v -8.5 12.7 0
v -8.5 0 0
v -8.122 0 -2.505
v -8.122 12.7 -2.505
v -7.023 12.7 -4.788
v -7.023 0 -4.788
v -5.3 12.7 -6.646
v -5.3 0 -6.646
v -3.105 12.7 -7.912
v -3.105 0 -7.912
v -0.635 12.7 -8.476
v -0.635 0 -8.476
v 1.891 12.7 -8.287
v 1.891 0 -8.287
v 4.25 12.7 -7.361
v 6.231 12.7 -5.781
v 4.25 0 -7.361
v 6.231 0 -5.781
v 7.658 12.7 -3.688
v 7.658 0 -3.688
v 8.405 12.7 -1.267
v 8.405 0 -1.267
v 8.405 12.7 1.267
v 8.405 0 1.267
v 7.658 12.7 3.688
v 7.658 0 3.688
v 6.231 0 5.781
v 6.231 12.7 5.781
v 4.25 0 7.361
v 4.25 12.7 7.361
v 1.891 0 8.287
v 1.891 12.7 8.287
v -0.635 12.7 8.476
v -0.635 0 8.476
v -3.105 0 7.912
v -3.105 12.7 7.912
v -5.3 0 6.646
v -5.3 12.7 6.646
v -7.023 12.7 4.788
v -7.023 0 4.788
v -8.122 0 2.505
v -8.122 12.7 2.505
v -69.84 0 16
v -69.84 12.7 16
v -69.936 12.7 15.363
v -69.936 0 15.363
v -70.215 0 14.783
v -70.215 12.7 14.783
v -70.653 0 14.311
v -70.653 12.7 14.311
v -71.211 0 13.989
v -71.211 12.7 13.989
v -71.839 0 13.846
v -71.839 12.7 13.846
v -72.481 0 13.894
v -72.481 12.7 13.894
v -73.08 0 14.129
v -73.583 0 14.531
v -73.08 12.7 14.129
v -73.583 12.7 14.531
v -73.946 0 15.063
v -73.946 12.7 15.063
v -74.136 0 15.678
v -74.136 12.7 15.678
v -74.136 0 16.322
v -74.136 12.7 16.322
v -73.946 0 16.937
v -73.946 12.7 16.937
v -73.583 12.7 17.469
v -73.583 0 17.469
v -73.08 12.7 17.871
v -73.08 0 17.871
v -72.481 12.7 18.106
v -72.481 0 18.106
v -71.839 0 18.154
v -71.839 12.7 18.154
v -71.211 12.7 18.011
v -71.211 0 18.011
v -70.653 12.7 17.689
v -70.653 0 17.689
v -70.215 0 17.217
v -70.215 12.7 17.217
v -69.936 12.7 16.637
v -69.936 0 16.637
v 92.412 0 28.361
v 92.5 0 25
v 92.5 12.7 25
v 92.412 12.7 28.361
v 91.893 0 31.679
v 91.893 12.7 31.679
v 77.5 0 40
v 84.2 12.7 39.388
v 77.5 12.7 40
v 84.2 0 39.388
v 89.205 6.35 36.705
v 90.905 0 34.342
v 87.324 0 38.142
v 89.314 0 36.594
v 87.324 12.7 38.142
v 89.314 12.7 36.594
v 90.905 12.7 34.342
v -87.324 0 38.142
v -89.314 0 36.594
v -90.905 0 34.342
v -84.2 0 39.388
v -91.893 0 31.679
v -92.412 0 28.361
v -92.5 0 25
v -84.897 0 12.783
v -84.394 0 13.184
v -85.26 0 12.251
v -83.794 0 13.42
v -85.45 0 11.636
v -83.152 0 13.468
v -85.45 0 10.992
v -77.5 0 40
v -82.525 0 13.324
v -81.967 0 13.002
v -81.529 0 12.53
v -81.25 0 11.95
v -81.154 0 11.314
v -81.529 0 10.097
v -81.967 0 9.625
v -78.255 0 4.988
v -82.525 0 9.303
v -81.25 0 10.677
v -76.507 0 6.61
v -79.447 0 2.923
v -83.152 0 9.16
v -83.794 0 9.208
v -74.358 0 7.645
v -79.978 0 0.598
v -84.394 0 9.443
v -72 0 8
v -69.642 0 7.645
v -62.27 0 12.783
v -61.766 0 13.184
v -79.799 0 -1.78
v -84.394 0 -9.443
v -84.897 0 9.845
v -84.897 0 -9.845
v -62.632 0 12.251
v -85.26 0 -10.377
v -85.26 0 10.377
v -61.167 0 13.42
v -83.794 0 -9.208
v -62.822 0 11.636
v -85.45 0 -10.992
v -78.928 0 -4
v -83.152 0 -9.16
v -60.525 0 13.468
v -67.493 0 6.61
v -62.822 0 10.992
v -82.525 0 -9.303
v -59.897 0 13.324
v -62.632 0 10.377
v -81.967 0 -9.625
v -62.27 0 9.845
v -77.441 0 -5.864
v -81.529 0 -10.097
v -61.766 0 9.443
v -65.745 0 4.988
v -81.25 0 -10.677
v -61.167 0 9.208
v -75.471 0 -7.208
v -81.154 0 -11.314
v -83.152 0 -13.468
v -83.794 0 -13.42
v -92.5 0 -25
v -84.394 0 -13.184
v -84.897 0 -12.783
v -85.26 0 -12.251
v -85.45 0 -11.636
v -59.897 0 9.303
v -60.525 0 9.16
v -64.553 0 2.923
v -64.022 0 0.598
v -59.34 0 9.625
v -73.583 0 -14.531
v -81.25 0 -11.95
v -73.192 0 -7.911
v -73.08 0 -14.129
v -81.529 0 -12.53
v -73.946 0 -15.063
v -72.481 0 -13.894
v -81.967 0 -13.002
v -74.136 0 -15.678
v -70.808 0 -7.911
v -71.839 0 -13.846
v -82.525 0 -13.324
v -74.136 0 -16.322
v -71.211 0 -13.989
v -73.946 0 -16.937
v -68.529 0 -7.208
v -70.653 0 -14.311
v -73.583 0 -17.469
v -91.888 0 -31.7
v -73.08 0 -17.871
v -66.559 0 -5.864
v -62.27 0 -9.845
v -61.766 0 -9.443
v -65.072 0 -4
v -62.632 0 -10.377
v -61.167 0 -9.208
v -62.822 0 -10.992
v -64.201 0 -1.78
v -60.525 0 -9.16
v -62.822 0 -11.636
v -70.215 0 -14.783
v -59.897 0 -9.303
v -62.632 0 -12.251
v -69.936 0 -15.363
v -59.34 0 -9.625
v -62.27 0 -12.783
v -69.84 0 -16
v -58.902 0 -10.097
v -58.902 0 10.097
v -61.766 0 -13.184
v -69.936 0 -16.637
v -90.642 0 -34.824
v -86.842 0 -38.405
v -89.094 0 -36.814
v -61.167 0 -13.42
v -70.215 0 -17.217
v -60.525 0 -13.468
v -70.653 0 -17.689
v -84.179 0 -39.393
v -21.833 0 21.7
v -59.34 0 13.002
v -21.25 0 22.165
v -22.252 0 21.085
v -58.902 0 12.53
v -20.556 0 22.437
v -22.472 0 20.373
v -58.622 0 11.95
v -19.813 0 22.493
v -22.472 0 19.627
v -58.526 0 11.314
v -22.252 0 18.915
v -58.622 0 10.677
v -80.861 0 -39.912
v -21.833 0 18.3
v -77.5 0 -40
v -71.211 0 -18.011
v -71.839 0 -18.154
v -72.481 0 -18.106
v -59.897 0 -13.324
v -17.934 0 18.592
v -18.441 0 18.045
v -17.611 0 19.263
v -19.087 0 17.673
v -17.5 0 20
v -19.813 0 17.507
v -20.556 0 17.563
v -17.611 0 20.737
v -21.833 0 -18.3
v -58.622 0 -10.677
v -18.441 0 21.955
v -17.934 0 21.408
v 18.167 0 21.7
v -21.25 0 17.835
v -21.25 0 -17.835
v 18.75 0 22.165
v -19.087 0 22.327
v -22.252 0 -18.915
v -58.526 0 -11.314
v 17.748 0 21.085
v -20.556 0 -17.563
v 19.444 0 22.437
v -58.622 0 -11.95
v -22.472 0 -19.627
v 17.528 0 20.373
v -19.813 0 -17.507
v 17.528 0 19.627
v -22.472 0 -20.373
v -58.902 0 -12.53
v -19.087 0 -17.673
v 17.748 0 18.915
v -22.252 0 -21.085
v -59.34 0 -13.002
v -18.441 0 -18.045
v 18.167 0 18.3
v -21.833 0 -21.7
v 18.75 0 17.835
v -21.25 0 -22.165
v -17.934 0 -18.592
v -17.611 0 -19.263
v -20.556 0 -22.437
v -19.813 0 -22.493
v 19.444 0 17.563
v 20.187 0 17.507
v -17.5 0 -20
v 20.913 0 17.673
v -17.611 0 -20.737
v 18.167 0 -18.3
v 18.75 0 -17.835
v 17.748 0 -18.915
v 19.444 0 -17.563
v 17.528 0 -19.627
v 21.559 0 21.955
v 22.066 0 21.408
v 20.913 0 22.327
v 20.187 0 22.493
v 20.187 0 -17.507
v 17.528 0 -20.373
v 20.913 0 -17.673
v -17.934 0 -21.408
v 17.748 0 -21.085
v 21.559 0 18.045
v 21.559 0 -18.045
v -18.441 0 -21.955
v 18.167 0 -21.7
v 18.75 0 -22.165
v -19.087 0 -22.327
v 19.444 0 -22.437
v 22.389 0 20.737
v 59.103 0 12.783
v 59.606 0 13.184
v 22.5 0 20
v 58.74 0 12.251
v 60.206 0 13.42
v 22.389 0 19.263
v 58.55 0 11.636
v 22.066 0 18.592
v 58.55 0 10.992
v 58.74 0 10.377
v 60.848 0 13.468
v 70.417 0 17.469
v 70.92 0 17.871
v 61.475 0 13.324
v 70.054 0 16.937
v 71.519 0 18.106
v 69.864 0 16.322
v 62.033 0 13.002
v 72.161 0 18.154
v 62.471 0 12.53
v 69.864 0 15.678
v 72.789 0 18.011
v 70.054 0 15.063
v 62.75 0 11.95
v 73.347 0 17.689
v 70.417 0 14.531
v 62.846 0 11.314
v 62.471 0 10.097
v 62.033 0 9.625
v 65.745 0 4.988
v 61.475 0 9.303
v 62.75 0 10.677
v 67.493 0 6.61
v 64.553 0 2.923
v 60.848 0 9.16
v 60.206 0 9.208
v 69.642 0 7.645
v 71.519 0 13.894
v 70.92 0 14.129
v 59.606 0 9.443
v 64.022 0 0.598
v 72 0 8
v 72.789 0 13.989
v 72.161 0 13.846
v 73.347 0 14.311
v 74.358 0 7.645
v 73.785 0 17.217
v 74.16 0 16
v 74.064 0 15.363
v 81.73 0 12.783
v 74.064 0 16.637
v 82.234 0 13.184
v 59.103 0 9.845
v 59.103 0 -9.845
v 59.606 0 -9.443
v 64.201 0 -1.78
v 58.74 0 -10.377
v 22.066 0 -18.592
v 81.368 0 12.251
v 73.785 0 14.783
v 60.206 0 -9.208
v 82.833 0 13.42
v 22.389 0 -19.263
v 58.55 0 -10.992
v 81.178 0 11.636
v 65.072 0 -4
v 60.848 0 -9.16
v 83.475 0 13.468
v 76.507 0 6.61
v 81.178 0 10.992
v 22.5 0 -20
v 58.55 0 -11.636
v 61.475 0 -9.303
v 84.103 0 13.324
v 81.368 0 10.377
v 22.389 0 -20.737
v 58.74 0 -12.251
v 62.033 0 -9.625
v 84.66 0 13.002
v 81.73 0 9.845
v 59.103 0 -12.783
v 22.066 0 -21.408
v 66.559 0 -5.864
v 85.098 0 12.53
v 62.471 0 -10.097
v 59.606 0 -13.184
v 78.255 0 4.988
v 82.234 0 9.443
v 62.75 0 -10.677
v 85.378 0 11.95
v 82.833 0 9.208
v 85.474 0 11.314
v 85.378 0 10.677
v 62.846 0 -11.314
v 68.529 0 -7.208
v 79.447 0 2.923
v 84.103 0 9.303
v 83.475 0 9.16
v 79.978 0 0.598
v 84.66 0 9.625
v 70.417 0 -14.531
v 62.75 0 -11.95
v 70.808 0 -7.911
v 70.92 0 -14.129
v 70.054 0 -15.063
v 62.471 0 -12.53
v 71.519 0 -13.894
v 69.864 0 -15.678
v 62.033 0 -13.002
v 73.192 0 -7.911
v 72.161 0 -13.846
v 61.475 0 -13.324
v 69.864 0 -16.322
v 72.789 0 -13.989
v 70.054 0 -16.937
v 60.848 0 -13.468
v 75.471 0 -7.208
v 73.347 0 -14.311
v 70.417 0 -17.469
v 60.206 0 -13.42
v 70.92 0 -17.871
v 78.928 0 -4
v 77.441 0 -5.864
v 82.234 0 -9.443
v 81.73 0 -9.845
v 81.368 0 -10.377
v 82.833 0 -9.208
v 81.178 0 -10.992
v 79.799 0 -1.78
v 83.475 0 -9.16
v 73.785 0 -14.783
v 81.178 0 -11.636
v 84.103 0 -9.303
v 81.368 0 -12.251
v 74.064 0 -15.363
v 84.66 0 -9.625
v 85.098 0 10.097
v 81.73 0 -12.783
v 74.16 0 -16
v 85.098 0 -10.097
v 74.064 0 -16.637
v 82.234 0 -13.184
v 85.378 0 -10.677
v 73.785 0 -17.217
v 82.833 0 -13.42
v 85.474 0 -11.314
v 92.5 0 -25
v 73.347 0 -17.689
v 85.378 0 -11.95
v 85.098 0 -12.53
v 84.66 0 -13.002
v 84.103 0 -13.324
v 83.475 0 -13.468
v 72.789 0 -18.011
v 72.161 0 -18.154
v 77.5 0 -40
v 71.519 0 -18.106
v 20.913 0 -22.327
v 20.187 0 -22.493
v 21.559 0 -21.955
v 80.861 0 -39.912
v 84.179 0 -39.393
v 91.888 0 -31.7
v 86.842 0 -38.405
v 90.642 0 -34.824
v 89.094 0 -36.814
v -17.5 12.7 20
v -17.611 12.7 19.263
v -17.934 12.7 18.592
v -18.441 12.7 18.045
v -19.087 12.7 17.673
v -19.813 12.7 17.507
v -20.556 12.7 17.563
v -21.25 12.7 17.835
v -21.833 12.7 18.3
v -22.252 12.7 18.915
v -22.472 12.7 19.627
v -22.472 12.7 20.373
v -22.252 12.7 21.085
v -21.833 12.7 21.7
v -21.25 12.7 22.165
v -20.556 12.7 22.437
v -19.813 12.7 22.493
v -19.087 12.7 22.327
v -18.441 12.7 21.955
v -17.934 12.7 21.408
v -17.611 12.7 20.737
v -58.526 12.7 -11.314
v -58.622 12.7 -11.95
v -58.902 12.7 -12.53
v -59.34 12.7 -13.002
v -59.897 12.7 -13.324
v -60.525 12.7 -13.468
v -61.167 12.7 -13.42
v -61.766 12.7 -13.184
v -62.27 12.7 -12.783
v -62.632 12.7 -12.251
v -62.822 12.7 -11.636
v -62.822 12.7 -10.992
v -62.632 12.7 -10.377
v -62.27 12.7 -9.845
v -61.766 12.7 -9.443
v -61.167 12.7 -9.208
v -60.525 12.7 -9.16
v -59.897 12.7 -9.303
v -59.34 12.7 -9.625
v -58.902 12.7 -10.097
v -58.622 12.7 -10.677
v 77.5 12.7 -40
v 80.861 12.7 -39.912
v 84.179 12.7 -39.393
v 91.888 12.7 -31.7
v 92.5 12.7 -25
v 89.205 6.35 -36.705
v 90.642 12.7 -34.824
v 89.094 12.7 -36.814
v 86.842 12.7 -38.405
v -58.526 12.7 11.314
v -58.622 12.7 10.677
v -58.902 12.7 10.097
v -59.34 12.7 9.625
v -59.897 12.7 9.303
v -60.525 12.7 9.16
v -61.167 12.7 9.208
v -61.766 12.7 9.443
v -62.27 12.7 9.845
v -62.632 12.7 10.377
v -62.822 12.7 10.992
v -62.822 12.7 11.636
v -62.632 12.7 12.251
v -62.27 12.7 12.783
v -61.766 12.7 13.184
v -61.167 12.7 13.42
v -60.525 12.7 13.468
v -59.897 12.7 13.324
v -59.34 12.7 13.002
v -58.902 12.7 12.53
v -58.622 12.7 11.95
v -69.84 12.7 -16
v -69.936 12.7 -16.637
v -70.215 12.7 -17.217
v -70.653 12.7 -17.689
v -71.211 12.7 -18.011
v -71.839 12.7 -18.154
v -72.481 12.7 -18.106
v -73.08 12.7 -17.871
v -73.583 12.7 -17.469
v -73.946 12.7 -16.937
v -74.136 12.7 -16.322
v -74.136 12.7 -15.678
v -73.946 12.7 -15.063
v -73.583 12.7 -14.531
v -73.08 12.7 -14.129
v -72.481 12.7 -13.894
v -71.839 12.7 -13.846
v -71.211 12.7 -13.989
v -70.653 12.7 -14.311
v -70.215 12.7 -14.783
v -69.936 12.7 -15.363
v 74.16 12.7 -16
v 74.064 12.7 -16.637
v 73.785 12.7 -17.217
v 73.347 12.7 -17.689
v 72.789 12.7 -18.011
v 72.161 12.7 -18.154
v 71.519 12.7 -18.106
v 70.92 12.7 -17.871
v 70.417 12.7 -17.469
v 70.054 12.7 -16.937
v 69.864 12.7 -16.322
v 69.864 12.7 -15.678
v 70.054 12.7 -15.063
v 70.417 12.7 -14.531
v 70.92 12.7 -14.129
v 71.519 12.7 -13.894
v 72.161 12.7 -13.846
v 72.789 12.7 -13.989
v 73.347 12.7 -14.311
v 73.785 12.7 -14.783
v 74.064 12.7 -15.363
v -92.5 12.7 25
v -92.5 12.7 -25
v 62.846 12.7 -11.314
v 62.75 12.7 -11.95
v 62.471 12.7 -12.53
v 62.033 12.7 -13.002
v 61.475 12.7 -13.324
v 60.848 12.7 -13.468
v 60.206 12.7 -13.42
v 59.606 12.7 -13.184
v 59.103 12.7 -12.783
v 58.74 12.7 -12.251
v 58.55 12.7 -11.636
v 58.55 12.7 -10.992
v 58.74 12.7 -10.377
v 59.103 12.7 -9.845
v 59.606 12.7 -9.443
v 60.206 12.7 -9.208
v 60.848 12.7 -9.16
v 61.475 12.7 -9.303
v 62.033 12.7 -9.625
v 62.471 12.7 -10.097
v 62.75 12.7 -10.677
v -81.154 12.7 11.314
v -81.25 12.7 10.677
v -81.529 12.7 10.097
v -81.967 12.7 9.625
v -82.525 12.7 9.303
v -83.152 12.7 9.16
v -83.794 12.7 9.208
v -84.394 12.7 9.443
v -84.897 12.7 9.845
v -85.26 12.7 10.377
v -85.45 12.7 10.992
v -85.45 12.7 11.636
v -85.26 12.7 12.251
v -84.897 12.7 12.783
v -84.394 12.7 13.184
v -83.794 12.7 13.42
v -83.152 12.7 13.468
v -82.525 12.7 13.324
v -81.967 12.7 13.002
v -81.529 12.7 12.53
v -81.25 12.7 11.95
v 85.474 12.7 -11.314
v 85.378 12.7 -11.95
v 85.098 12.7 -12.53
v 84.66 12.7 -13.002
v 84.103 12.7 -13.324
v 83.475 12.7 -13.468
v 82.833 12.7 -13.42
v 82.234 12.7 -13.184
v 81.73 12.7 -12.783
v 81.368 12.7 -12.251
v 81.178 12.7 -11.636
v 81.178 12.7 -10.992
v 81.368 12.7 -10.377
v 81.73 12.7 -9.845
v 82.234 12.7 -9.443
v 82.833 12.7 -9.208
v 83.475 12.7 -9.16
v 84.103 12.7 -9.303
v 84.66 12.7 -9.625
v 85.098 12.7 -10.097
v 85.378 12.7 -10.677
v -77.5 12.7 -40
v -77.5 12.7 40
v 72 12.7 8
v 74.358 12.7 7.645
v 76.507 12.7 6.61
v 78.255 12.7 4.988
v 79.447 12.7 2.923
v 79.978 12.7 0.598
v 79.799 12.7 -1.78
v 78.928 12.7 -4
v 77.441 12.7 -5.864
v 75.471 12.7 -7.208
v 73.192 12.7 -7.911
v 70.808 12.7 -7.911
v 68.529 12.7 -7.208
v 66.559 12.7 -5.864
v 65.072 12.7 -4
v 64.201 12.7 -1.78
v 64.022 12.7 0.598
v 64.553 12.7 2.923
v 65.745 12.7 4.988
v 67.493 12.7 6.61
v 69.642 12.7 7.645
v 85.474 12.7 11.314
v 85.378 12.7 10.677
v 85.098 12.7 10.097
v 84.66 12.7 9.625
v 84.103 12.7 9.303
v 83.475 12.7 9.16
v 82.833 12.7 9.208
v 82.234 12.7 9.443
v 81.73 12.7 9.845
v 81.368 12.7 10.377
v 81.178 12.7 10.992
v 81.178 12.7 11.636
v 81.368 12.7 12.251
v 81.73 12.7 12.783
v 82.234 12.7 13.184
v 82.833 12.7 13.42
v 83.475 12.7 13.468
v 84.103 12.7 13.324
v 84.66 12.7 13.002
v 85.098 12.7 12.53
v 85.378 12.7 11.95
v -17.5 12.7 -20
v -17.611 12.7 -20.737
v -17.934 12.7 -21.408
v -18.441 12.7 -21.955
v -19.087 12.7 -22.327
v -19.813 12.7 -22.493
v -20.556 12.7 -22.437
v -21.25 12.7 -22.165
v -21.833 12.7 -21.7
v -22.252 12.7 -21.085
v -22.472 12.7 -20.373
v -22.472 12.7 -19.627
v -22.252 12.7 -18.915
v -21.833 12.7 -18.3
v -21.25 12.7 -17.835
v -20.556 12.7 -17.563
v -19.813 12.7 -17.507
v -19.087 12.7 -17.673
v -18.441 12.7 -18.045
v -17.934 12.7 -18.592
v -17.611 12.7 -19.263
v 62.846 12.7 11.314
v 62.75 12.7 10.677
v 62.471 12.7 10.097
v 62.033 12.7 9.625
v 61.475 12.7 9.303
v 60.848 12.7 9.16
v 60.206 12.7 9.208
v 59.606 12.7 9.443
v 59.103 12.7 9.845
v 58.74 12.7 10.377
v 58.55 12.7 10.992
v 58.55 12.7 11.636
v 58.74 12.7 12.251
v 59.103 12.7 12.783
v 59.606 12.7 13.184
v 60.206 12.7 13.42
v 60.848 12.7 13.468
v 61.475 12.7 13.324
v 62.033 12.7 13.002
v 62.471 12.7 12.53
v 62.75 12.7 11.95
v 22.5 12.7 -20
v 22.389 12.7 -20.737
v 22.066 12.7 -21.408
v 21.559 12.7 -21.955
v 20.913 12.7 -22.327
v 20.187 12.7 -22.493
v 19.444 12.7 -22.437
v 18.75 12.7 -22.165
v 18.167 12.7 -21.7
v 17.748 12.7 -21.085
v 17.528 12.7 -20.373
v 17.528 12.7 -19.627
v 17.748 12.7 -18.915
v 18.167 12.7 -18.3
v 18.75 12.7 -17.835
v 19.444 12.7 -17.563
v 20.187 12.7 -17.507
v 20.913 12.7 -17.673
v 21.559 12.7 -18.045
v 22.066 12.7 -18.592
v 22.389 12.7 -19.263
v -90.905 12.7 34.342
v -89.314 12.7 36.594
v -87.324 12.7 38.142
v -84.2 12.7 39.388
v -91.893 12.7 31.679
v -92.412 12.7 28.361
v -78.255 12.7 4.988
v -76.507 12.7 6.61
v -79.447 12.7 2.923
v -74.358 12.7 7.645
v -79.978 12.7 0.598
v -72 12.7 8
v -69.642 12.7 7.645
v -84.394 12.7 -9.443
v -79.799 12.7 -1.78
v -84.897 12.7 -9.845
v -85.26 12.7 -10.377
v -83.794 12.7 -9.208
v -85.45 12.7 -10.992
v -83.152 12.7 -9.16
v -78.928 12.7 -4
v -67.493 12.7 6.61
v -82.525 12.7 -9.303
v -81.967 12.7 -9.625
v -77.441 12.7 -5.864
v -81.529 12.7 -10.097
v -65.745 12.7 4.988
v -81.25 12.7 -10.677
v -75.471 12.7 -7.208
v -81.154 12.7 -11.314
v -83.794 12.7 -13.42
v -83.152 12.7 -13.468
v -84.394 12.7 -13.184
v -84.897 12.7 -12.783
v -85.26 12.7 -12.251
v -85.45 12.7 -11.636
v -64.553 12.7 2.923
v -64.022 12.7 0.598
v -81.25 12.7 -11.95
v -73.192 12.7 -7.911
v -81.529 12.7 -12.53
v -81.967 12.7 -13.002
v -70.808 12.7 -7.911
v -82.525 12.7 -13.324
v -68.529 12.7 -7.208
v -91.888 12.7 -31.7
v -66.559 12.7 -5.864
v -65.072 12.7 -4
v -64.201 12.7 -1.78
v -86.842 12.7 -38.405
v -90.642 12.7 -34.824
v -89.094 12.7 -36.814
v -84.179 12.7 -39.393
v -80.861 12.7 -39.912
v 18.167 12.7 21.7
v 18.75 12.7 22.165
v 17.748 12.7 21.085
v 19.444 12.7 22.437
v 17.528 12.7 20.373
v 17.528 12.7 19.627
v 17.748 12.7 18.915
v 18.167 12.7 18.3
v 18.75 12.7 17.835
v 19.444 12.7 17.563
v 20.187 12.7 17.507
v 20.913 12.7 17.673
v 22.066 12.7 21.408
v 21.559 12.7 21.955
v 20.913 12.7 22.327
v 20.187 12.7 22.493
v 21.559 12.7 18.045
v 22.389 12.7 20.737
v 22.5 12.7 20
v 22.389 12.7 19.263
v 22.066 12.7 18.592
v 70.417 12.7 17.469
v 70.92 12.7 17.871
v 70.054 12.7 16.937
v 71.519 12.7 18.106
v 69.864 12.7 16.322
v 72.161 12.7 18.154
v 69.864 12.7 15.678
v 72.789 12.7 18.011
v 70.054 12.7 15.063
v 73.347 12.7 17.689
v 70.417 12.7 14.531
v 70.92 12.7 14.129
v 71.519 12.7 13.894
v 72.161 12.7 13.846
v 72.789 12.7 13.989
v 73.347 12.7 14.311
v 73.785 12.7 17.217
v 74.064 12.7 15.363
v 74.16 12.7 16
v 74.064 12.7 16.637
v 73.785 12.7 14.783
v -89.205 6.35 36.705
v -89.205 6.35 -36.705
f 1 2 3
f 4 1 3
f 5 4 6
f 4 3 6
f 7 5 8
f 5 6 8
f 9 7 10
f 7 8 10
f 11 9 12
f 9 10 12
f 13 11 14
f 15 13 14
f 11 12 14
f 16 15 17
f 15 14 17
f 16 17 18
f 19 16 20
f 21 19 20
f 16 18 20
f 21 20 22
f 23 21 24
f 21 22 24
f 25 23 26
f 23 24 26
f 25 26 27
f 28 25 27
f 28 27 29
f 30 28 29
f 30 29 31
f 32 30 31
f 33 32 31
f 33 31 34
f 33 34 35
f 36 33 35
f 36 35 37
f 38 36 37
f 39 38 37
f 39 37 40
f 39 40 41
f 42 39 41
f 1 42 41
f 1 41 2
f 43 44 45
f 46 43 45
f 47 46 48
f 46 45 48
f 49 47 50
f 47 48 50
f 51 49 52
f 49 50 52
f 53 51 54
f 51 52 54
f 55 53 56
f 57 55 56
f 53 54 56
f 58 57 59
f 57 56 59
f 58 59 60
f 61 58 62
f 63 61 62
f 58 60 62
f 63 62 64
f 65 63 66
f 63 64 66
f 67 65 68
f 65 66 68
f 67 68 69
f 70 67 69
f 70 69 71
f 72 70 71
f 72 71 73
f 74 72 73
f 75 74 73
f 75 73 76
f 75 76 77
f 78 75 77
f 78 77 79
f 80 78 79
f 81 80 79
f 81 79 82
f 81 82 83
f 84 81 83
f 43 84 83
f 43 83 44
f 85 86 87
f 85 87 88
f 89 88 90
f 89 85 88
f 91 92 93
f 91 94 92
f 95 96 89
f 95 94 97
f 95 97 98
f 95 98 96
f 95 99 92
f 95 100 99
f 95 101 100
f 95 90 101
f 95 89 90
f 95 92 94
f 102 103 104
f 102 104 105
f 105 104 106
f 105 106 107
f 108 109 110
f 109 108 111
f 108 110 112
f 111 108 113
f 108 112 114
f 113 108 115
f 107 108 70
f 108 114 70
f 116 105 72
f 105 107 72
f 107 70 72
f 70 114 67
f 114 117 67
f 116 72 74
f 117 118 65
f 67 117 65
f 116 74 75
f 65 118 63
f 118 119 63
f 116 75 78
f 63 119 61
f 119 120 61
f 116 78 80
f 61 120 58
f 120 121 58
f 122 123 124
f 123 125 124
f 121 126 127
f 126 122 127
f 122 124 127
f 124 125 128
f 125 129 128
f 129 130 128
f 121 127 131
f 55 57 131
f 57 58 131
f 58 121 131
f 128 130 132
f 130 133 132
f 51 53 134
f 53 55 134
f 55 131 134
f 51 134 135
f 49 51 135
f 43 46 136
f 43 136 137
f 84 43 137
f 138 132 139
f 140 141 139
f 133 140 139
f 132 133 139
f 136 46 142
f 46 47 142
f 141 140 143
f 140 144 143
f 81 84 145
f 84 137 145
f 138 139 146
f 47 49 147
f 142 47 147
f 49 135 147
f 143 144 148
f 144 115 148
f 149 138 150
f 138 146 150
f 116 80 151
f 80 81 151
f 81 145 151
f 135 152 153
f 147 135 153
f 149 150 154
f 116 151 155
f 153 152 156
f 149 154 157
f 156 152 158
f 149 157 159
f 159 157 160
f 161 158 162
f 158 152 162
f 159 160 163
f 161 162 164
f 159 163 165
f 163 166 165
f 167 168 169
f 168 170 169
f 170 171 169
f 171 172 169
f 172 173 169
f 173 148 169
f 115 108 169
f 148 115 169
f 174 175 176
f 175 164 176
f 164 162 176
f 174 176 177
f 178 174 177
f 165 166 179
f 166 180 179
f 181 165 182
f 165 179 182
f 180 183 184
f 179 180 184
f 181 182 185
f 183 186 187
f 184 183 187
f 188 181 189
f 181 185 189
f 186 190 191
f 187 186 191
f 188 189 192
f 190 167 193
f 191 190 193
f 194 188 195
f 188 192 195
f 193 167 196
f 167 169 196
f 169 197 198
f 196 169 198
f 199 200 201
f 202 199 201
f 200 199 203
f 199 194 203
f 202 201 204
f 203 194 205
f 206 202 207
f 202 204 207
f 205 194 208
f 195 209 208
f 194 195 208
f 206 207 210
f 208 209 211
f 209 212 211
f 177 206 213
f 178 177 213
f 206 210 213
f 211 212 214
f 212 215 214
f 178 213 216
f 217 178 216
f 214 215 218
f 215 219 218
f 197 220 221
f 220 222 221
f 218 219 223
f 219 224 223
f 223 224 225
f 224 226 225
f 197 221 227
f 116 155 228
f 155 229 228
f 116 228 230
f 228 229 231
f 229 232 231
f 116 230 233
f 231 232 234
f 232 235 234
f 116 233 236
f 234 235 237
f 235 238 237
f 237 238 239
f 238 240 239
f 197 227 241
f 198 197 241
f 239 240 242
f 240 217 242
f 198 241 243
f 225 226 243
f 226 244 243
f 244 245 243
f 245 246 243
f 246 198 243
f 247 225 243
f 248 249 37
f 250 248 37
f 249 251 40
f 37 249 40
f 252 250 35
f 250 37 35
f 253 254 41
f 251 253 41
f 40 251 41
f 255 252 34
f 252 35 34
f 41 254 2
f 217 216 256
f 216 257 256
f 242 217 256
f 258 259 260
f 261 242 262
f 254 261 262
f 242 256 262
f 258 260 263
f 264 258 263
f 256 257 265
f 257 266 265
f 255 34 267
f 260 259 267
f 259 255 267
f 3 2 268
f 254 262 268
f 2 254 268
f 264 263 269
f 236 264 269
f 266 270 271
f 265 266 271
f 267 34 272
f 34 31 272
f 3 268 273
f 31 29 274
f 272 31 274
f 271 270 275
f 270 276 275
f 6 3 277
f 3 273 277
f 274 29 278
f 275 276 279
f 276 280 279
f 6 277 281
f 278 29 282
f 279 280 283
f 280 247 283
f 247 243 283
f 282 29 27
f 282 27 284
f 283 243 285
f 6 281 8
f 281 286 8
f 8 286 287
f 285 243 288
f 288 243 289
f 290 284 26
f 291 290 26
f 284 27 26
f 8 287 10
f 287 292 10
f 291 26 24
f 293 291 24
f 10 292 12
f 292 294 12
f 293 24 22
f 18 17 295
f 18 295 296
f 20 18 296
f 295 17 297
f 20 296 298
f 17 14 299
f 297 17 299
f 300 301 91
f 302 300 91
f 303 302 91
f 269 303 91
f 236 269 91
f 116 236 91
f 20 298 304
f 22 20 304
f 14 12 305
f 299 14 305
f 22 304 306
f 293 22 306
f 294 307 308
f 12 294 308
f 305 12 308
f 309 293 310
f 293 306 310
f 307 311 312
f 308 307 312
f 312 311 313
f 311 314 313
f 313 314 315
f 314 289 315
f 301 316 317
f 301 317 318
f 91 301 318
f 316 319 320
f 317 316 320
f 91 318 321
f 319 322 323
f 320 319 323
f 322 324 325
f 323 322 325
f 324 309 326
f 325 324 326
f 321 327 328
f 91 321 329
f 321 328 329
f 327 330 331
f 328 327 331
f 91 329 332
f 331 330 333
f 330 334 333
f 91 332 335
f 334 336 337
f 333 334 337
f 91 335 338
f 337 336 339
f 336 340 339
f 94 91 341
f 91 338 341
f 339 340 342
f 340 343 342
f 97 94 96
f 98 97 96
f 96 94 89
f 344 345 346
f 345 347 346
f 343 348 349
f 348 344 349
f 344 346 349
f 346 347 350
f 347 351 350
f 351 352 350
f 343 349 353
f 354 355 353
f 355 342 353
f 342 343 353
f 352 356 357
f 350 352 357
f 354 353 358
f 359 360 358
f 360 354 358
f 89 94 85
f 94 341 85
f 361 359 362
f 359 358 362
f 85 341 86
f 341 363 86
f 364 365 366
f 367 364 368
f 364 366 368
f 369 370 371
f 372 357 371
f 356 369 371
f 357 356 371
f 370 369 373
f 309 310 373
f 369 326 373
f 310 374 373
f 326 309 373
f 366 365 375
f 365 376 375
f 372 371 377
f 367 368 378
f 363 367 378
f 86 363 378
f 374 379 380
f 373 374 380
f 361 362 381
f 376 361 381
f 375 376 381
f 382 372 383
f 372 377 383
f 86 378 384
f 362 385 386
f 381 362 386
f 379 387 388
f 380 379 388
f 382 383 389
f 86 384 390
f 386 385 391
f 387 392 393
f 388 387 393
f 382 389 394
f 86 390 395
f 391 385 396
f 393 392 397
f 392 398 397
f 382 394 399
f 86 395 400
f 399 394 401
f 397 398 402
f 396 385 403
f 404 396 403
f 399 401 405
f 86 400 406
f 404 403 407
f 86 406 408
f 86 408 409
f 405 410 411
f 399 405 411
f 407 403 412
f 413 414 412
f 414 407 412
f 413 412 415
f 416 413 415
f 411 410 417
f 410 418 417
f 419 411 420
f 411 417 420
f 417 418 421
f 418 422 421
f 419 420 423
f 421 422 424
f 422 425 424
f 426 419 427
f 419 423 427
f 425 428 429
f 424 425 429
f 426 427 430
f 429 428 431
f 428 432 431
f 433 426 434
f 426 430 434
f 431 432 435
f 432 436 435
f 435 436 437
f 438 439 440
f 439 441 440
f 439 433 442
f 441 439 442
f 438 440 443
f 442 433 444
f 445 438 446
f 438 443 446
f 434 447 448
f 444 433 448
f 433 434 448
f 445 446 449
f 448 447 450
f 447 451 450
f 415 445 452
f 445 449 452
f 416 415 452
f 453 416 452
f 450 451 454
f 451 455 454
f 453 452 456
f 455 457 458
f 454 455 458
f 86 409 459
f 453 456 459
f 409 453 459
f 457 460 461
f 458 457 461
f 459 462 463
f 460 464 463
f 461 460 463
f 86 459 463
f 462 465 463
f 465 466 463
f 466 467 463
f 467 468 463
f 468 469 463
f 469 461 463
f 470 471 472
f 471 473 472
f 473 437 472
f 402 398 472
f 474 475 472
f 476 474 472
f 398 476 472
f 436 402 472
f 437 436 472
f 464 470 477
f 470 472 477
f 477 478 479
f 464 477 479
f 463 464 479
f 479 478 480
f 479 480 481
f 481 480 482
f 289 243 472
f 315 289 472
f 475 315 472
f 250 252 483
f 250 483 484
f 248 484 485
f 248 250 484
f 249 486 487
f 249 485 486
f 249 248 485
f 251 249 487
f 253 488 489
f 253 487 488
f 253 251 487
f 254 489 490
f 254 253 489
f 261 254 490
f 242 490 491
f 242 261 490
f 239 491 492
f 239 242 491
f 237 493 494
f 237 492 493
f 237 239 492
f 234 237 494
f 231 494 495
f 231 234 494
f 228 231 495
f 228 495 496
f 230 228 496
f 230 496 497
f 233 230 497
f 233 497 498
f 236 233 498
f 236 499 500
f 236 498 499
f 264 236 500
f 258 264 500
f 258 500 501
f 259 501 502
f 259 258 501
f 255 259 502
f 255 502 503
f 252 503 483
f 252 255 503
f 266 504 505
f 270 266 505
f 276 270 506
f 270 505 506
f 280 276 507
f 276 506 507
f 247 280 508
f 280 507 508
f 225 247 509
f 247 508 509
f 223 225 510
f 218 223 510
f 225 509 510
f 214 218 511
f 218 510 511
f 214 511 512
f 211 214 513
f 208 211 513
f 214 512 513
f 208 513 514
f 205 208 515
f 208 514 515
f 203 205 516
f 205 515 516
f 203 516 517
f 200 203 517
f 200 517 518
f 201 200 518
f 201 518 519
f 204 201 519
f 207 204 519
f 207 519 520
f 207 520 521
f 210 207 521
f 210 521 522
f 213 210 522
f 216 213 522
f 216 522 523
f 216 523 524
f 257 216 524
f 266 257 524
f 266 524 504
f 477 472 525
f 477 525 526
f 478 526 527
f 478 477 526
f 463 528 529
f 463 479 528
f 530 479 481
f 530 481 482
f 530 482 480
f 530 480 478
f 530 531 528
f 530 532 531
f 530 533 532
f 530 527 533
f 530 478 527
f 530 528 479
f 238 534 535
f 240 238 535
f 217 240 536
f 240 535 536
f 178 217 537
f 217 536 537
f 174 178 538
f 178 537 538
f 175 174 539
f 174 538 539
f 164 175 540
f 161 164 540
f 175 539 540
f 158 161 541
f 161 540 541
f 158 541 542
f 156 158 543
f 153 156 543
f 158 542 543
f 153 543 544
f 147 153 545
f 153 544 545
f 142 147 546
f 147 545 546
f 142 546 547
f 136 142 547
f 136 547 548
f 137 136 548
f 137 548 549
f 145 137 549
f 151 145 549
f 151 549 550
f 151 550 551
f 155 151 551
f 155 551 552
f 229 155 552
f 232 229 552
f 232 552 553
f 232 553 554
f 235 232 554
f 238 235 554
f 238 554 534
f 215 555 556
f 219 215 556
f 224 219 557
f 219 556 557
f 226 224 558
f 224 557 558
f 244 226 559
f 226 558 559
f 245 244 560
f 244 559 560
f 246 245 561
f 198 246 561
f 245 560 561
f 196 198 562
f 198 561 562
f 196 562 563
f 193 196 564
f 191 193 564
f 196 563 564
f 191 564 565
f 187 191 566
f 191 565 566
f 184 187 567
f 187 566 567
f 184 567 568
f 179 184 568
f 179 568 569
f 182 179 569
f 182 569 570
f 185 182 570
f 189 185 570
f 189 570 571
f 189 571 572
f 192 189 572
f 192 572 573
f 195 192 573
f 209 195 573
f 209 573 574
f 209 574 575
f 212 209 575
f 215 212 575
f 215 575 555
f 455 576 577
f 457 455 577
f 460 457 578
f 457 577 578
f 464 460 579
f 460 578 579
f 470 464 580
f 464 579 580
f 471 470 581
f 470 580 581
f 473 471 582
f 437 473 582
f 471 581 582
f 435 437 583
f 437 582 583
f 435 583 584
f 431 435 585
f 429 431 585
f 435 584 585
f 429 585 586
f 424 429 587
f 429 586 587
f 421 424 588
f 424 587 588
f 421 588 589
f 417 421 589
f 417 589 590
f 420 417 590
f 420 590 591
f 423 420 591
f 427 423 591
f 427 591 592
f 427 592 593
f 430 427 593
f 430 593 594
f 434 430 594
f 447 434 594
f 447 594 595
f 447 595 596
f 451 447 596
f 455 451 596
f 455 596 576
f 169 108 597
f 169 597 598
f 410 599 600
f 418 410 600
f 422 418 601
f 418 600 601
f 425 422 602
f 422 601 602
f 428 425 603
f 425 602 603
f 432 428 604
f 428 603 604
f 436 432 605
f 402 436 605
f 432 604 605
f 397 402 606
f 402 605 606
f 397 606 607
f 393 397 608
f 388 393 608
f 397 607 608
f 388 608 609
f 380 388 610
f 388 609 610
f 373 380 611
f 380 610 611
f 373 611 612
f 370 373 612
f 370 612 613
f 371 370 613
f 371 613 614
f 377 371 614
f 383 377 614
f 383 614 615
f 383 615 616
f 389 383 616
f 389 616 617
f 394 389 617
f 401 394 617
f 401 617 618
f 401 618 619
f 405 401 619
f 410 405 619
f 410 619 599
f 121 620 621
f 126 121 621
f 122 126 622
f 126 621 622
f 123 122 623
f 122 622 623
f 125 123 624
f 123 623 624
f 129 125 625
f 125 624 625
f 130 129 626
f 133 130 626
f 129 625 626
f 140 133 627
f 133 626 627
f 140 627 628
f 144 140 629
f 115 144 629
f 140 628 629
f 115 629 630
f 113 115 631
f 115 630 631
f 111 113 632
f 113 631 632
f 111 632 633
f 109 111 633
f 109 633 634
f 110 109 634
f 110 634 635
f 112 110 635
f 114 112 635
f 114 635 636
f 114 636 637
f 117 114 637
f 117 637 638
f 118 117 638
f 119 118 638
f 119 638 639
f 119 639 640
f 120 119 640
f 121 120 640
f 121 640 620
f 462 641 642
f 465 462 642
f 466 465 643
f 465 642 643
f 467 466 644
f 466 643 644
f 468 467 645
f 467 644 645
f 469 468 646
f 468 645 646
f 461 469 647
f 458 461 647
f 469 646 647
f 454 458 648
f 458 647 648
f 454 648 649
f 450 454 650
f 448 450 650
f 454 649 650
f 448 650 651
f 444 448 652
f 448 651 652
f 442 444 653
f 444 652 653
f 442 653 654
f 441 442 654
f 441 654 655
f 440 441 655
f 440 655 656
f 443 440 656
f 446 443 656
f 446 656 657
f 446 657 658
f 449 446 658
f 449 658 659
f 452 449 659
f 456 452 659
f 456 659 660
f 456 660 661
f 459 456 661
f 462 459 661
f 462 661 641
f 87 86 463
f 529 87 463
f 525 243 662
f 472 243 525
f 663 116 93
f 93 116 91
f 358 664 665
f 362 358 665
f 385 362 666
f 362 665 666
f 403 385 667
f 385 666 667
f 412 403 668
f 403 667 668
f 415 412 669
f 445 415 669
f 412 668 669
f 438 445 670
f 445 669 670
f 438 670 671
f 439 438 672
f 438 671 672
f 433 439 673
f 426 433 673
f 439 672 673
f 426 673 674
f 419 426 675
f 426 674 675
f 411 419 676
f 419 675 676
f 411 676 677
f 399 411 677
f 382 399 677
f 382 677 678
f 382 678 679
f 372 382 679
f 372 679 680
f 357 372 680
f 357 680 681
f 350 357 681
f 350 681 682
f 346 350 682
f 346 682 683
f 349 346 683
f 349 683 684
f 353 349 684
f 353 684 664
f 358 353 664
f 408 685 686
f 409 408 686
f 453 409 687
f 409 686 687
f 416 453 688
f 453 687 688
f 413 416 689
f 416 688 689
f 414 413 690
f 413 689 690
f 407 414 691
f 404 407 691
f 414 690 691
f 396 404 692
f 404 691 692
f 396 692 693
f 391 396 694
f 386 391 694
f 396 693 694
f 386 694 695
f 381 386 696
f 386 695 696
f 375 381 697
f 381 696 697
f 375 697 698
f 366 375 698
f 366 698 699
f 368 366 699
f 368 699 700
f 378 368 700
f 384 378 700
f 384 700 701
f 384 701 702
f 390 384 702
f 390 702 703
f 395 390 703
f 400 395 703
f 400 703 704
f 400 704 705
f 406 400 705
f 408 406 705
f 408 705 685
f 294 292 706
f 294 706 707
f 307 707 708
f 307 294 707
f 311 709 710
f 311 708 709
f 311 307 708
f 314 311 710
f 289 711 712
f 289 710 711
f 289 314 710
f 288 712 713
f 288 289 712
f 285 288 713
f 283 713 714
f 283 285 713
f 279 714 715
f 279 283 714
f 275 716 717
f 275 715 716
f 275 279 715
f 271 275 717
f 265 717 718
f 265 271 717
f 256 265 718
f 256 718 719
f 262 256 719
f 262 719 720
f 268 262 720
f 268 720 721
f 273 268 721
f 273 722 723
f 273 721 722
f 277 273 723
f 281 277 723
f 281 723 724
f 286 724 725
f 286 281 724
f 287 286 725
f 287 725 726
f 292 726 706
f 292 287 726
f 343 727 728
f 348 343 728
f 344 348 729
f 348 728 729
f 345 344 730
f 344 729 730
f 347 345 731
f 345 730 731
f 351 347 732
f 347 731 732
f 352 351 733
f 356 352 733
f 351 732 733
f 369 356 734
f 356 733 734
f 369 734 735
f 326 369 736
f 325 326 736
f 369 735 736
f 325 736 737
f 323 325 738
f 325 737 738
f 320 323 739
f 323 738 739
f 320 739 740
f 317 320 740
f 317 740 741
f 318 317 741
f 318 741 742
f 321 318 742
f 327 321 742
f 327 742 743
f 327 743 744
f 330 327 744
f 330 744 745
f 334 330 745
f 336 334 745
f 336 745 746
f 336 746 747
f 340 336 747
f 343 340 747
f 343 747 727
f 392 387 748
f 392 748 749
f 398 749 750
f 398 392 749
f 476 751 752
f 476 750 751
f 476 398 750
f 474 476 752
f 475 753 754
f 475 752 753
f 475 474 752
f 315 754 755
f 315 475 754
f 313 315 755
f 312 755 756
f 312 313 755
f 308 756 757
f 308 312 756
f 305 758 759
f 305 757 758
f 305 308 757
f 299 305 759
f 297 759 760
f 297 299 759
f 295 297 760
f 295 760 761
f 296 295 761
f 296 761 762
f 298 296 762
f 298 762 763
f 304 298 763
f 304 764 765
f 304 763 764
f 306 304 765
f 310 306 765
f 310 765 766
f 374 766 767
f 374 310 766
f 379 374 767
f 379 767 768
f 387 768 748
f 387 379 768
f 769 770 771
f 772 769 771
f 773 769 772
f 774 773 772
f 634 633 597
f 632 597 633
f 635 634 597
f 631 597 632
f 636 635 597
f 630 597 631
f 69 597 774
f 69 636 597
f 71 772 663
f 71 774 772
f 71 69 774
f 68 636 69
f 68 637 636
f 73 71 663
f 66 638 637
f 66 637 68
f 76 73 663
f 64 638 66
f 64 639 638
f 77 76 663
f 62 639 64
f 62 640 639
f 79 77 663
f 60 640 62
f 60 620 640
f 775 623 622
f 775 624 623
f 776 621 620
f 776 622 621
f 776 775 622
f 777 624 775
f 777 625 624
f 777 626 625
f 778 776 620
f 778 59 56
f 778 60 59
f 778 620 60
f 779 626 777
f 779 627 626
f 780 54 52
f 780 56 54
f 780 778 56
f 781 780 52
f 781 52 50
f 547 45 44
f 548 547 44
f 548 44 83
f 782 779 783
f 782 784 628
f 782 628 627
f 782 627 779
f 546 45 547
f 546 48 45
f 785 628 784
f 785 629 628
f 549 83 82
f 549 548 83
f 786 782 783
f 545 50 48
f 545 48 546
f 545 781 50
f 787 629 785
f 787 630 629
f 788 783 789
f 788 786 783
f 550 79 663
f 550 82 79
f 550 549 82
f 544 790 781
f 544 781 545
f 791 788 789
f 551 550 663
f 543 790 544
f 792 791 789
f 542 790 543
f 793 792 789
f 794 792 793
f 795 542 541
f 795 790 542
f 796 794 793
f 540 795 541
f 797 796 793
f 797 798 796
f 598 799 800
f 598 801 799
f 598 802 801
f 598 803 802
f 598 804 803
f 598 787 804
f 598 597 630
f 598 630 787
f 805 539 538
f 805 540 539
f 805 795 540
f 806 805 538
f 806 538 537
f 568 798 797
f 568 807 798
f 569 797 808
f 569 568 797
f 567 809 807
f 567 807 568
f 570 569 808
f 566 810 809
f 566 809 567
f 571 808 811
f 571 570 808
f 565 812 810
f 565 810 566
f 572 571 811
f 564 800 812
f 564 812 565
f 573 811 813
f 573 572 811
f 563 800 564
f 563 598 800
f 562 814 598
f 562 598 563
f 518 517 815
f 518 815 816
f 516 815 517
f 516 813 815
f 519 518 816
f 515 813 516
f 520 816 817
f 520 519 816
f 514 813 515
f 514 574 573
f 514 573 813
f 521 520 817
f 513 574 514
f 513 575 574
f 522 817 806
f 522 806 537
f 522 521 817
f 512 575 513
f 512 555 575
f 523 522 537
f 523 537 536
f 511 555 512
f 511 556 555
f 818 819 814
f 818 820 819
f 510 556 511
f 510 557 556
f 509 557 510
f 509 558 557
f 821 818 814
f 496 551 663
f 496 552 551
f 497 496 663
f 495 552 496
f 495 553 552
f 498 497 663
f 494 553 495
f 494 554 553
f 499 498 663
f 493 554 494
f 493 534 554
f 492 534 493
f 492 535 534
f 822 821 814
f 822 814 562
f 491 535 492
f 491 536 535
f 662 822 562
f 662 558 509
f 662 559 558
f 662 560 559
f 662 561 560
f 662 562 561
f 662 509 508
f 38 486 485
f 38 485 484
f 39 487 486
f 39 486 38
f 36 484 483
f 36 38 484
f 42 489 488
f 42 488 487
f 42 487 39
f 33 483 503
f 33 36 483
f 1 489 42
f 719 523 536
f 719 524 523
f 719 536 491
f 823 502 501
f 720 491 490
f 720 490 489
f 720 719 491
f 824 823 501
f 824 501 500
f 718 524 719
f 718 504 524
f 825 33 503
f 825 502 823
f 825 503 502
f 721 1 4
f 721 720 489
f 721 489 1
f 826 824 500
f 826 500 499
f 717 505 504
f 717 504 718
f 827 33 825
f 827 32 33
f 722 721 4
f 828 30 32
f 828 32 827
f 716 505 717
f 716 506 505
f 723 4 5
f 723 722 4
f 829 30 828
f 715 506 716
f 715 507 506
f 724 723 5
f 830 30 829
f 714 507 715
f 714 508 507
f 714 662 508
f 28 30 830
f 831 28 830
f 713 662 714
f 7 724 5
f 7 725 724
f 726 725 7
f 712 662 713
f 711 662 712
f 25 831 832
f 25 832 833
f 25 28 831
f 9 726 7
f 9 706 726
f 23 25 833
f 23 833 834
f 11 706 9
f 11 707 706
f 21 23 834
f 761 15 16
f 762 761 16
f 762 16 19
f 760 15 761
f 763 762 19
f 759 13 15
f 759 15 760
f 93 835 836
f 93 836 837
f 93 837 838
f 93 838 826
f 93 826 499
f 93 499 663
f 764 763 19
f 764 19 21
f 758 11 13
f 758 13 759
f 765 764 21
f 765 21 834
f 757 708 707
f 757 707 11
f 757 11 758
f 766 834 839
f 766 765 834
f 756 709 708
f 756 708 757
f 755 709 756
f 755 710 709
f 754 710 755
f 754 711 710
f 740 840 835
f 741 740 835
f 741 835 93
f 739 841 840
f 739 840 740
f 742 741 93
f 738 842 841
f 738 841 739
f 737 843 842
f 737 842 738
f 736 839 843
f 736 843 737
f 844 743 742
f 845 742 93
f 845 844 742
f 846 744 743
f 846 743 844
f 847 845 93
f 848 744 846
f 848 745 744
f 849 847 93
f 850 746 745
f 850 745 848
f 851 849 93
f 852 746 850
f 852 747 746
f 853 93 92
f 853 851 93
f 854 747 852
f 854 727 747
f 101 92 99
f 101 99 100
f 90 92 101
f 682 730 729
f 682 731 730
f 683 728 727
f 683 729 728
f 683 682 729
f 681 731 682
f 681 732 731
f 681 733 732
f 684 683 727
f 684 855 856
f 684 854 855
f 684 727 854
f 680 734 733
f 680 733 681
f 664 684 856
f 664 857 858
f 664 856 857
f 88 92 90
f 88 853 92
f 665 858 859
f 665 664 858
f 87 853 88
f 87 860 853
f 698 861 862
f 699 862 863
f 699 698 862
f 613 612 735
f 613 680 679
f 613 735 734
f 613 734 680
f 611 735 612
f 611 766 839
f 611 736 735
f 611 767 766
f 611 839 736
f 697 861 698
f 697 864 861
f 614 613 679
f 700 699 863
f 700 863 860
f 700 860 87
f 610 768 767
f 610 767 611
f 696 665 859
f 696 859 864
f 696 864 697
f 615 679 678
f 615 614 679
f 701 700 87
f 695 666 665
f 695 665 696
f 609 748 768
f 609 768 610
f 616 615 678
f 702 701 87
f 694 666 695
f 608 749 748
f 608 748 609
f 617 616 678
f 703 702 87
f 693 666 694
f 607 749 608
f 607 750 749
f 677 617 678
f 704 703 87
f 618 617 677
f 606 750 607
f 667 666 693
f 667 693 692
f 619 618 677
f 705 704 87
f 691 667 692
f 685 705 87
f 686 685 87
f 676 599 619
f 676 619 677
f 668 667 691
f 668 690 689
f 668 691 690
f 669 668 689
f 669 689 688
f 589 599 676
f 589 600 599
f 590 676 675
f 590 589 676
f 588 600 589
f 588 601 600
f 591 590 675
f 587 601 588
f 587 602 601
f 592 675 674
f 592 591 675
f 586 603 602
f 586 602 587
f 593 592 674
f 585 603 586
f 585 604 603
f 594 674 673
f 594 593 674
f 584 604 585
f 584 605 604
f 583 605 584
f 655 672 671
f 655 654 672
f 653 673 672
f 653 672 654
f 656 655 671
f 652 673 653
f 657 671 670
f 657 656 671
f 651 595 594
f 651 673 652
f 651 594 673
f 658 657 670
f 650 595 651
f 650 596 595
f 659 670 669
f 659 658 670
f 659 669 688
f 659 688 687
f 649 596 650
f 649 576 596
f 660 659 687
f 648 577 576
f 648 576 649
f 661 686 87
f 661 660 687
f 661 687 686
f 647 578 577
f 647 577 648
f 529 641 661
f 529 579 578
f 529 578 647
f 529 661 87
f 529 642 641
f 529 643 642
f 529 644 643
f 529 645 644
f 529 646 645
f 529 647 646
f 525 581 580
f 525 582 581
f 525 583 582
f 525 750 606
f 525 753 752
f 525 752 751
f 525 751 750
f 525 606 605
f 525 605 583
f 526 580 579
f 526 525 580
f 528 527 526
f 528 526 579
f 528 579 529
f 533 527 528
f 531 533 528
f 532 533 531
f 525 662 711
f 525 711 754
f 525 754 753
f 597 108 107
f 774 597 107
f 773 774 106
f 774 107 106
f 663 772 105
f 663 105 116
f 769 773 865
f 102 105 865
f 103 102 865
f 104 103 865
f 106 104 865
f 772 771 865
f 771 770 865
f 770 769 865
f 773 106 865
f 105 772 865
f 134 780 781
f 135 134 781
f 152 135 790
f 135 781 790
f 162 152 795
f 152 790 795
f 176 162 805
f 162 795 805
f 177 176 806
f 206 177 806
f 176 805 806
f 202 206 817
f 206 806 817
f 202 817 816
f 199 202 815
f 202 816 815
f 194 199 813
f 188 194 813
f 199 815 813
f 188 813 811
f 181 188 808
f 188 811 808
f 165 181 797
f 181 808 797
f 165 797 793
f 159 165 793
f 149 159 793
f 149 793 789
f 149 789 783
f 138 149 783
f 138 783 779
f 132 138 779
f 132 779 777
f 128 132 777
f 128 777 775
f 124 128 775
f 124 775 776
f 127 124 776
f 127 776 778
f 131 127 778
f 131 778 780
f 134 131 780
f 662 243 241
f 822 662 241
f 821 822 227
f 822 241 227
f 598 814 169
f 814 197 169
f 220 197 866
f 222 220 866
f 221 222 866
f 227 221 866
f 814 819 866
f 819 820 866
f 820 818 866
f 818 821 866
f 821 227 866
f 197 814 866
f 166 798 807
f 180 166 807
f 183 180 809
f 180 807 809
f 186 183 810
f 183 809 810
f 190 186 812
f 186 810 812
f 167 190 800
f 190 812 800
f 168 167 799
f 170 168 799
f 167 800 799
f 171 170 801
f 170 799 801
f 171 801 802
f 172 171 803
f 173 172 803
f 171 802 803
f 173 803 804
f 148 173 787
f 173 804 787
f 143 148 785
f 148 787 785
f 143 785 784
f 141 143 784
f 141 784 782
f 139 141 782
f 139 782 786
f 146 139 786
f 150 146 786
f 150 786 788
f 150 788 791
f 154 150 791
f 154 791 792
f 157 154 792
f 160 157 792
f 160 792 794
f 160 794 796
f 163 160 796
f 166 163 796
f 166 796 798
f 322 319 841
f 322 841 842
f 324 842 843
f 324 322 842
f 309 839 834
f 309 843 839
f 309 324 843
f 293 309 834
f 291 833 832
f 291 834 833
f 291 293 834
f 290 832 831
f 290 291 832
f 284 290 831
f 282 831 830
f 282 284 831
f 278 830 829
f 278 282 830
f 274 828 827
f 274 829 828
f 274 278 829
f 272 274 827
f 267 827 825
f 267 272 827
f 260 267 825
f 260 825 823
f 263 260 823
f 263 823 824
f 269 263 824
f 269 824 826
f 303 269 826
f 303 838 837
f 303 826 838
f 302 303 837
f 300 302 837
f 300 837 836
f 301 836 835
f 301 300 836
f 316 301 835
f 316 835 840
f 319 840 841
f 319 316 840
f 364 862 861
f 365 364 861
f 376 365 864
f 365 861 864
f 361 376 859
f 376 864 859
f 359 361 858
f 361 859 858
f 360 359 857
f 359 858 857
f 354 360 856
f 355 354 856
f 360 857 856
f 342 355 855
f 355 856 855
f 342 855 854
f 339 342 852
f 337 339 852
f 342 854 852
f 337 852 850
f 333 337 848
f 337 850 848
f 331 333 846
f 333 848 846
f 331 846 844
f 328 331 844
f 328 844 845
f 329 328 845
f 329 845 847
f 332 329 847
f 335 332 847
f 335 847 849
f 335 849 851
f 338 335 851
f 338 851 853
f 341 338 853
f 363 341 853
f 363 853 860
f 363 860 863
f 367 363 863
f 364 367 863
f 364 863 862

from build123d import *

# Parameters (mm, degrees)
SKETCH1_W                     = 185
SKETCH1_H                     = 80
BOSS_EXTRUDE1_DEPTH           = 12.7
M16_CLEARANCE_HOLE1_D         = 17
M6X1_0_START                  = -1
M6X1_0_TAPPED_HOLE2_OUTLINE_R = 2.5
M6X1_0_TAPPED_HOLE2_DEPTH     = 15
FILLET1_SIZE                  = 15
SKETCH5_R                     = 8
CUT_EXTRUDE1_DEPTH            = 102.575292414
M4_CLEARANCE_HOLE1_D          = 4.32


with BuildPart() as part:
    # Sketch1 → Boss-Extrude1 (new body)
    with BuildSketch(Plane(origin=(0, 0, 0), x_dir=(1, 0, 0), z_dir=(0, 1, 0))):
        Rectangle(SKETCH1_W, SKETCH1_H)
    extrude(amount=BOSS_EXTRUDE1_DEPTH)

    # M16 Clearance Hole1 (through all)
    with Locations(Plane(origin=(0, 12.7, 0), x_dir=(1, 0, 0), z_dir=(0, 1, 0))):
        with Locations((0, 0)):
            Hole(M16_CLEARANCE_HOLE1_D / 2)

    # M6x1.0 Tapped Hole2: read off the stored shape, not the designer's step
    # M6x1.0 Tapped Hole2 outline → M6x1.0 Tapped Hole2 (cut)
    with BuildSketch(Plane(origin=(0, 0, 0), x_dir=(1, 0, 0), z_dir=(0, 1, 0)).offset(M6X1_0_START)):
        with Locations((20, 20)):
            Circle(M6X1_0_TAPPED_HOLE2_OUTLINE_R)
        with Locations((-20, -20)):
            Circle(M6X1_0_TAPPED_HOLE2_OUTLINE_R)
        with Locations((20, -20)):
            Circle(M6X1_0_TAPPED_HOLE2_OUTLINE_R)
        with Locations((-20, 20)):
            Circle(M6X1_0_TAPPED_HOLE2_OUTLINE_R)
    extrude(amount=M6X1_0_TAPPED_HOLE2_DEPTH, mode=Mode.SUBTRACT)

    # Fillet1
    # a fillet whose section is not a circle: 15 mm, written as the material it takes off along each edge
    with BuildSketch(Plane(origin=(-92.5, -37.5, -40), x_dir=(1, 0, 0), z_dir=(0, 1, 0)), Plane(origin=(-92.5, -37.5, 40), x_dir=(0, 0, -1), z_dir=(0, 1, 0))) as fillet1_piece_1:
        with BuildLine():
            add(Edge.make_bspline([(FILLET1_SIZE, 0), (FILLET1_SIZE * 0.831801948466, 0), (FILLET1_SIZE * 0.663603896932, 0), (FILLET1_SIZE * 0.292893218813, -FILLET1_SIZE * 0.0716919198361), (FILLET1_SIZE * 0.0716919198361, -FILLET1_SIZE * 0.292893218813), (0, -FILLET1_SIZE * 0.663603896932), (0, -FILLET1_SIZE * 0.831801948466), (0, -FILLET1_SIZE)], knots=[0, 0, 0, 0, 0, 0, 0.5, 0.5, 1, 1, 1, 1, 1, 1], degree=5))
            Line((0, -FILLET1_SIZE), (0, 0))
            Line((0, 0), (FILLET1_SIZE, 0))
        make_face()
    extrude(amount=87.7, mode=Mode.SUBTRACT)
    with BuildSketch(Plane(origin=(92.5, -37.5, -40), x_dir=(-1, 0, 0), z_dir=(0, 1, 0)), Plane(origin=(92.5, -37.5, 40), x_dir=(0, 0, -1), z_dir=(0, 1, 0))) as fillet1_piece_2:
        with BuildLine():
            add(Edge.make_bspline([(FILLET1_SIZE, 0), (FILLET1_SIZE * 0.831801948466, 0), (FILLET1_SIZE * 0.663603896932, 0), (FILLET1_SIZE * 0.292893218813, FILLET1_SIZE * 0.0716919198361), (FILLET1_SIZE * 0.0716919198361, FILLET1_SIZE * 0.292893218813), (0, FILLET1_SIZE * 0.663603896932), (0, FILLET1_SIZE * 0.831801948466), (0, FILLET1_SIZE)], knots=[0, 0, 0, 0, 0, 0, 0.5, 0.5, 1, 1, 1, 1, 1, 1], degree=5))
            Line((0, FILLET1_SIZE), (0, 0))
            Line((0, 0), (FILLET1_SIZE, 0))
        make_face()
    extrude(amount=87.7, mode=Mode.SUBTRACT)

    # Sketch5 → Cut-Extrude1 (cut, through all)
    with BuildSketch(Plane(origin=(0, 12.7, 0), x_dir=(1, 0, 0), z_dir=(0, 1, 0))):
        with Locations(Location((-72, 0, 0), (0, 0, 270))):
            Circle(SKETCH5_R)
        with Locations(Location((72, 0, 0), (0, 0, 270))):
            Circle(SKETCH5_R)
    extrude(amount=-CUT_EXTRUDE1_DEPTH, mode=Mode.SUBTRACT)

    # M4 Clearance Hole1 (through all)
    with Locations(Plane(origin=(0, 0, 0), x_dir=(-1, 0, 0), z_dir=(0, -1, 0))):
        with Locations((60.686291501, 11.313708499), (72, 16), (83.313708499, 11.313708499), (60.686291501, -11.313708499), (72, -16), (83.313708499, -11.313708499), (-83.313708499, -11.313708499), (-72, -16), (-60.686291501, -11.313708499), (-60.686291501, 11.313708499), (-83.313708499, 11.313708499), (-72, 16)):
            Hole(M4_CLEARANCE_HOLE1_D / 2)


solid = part.part
